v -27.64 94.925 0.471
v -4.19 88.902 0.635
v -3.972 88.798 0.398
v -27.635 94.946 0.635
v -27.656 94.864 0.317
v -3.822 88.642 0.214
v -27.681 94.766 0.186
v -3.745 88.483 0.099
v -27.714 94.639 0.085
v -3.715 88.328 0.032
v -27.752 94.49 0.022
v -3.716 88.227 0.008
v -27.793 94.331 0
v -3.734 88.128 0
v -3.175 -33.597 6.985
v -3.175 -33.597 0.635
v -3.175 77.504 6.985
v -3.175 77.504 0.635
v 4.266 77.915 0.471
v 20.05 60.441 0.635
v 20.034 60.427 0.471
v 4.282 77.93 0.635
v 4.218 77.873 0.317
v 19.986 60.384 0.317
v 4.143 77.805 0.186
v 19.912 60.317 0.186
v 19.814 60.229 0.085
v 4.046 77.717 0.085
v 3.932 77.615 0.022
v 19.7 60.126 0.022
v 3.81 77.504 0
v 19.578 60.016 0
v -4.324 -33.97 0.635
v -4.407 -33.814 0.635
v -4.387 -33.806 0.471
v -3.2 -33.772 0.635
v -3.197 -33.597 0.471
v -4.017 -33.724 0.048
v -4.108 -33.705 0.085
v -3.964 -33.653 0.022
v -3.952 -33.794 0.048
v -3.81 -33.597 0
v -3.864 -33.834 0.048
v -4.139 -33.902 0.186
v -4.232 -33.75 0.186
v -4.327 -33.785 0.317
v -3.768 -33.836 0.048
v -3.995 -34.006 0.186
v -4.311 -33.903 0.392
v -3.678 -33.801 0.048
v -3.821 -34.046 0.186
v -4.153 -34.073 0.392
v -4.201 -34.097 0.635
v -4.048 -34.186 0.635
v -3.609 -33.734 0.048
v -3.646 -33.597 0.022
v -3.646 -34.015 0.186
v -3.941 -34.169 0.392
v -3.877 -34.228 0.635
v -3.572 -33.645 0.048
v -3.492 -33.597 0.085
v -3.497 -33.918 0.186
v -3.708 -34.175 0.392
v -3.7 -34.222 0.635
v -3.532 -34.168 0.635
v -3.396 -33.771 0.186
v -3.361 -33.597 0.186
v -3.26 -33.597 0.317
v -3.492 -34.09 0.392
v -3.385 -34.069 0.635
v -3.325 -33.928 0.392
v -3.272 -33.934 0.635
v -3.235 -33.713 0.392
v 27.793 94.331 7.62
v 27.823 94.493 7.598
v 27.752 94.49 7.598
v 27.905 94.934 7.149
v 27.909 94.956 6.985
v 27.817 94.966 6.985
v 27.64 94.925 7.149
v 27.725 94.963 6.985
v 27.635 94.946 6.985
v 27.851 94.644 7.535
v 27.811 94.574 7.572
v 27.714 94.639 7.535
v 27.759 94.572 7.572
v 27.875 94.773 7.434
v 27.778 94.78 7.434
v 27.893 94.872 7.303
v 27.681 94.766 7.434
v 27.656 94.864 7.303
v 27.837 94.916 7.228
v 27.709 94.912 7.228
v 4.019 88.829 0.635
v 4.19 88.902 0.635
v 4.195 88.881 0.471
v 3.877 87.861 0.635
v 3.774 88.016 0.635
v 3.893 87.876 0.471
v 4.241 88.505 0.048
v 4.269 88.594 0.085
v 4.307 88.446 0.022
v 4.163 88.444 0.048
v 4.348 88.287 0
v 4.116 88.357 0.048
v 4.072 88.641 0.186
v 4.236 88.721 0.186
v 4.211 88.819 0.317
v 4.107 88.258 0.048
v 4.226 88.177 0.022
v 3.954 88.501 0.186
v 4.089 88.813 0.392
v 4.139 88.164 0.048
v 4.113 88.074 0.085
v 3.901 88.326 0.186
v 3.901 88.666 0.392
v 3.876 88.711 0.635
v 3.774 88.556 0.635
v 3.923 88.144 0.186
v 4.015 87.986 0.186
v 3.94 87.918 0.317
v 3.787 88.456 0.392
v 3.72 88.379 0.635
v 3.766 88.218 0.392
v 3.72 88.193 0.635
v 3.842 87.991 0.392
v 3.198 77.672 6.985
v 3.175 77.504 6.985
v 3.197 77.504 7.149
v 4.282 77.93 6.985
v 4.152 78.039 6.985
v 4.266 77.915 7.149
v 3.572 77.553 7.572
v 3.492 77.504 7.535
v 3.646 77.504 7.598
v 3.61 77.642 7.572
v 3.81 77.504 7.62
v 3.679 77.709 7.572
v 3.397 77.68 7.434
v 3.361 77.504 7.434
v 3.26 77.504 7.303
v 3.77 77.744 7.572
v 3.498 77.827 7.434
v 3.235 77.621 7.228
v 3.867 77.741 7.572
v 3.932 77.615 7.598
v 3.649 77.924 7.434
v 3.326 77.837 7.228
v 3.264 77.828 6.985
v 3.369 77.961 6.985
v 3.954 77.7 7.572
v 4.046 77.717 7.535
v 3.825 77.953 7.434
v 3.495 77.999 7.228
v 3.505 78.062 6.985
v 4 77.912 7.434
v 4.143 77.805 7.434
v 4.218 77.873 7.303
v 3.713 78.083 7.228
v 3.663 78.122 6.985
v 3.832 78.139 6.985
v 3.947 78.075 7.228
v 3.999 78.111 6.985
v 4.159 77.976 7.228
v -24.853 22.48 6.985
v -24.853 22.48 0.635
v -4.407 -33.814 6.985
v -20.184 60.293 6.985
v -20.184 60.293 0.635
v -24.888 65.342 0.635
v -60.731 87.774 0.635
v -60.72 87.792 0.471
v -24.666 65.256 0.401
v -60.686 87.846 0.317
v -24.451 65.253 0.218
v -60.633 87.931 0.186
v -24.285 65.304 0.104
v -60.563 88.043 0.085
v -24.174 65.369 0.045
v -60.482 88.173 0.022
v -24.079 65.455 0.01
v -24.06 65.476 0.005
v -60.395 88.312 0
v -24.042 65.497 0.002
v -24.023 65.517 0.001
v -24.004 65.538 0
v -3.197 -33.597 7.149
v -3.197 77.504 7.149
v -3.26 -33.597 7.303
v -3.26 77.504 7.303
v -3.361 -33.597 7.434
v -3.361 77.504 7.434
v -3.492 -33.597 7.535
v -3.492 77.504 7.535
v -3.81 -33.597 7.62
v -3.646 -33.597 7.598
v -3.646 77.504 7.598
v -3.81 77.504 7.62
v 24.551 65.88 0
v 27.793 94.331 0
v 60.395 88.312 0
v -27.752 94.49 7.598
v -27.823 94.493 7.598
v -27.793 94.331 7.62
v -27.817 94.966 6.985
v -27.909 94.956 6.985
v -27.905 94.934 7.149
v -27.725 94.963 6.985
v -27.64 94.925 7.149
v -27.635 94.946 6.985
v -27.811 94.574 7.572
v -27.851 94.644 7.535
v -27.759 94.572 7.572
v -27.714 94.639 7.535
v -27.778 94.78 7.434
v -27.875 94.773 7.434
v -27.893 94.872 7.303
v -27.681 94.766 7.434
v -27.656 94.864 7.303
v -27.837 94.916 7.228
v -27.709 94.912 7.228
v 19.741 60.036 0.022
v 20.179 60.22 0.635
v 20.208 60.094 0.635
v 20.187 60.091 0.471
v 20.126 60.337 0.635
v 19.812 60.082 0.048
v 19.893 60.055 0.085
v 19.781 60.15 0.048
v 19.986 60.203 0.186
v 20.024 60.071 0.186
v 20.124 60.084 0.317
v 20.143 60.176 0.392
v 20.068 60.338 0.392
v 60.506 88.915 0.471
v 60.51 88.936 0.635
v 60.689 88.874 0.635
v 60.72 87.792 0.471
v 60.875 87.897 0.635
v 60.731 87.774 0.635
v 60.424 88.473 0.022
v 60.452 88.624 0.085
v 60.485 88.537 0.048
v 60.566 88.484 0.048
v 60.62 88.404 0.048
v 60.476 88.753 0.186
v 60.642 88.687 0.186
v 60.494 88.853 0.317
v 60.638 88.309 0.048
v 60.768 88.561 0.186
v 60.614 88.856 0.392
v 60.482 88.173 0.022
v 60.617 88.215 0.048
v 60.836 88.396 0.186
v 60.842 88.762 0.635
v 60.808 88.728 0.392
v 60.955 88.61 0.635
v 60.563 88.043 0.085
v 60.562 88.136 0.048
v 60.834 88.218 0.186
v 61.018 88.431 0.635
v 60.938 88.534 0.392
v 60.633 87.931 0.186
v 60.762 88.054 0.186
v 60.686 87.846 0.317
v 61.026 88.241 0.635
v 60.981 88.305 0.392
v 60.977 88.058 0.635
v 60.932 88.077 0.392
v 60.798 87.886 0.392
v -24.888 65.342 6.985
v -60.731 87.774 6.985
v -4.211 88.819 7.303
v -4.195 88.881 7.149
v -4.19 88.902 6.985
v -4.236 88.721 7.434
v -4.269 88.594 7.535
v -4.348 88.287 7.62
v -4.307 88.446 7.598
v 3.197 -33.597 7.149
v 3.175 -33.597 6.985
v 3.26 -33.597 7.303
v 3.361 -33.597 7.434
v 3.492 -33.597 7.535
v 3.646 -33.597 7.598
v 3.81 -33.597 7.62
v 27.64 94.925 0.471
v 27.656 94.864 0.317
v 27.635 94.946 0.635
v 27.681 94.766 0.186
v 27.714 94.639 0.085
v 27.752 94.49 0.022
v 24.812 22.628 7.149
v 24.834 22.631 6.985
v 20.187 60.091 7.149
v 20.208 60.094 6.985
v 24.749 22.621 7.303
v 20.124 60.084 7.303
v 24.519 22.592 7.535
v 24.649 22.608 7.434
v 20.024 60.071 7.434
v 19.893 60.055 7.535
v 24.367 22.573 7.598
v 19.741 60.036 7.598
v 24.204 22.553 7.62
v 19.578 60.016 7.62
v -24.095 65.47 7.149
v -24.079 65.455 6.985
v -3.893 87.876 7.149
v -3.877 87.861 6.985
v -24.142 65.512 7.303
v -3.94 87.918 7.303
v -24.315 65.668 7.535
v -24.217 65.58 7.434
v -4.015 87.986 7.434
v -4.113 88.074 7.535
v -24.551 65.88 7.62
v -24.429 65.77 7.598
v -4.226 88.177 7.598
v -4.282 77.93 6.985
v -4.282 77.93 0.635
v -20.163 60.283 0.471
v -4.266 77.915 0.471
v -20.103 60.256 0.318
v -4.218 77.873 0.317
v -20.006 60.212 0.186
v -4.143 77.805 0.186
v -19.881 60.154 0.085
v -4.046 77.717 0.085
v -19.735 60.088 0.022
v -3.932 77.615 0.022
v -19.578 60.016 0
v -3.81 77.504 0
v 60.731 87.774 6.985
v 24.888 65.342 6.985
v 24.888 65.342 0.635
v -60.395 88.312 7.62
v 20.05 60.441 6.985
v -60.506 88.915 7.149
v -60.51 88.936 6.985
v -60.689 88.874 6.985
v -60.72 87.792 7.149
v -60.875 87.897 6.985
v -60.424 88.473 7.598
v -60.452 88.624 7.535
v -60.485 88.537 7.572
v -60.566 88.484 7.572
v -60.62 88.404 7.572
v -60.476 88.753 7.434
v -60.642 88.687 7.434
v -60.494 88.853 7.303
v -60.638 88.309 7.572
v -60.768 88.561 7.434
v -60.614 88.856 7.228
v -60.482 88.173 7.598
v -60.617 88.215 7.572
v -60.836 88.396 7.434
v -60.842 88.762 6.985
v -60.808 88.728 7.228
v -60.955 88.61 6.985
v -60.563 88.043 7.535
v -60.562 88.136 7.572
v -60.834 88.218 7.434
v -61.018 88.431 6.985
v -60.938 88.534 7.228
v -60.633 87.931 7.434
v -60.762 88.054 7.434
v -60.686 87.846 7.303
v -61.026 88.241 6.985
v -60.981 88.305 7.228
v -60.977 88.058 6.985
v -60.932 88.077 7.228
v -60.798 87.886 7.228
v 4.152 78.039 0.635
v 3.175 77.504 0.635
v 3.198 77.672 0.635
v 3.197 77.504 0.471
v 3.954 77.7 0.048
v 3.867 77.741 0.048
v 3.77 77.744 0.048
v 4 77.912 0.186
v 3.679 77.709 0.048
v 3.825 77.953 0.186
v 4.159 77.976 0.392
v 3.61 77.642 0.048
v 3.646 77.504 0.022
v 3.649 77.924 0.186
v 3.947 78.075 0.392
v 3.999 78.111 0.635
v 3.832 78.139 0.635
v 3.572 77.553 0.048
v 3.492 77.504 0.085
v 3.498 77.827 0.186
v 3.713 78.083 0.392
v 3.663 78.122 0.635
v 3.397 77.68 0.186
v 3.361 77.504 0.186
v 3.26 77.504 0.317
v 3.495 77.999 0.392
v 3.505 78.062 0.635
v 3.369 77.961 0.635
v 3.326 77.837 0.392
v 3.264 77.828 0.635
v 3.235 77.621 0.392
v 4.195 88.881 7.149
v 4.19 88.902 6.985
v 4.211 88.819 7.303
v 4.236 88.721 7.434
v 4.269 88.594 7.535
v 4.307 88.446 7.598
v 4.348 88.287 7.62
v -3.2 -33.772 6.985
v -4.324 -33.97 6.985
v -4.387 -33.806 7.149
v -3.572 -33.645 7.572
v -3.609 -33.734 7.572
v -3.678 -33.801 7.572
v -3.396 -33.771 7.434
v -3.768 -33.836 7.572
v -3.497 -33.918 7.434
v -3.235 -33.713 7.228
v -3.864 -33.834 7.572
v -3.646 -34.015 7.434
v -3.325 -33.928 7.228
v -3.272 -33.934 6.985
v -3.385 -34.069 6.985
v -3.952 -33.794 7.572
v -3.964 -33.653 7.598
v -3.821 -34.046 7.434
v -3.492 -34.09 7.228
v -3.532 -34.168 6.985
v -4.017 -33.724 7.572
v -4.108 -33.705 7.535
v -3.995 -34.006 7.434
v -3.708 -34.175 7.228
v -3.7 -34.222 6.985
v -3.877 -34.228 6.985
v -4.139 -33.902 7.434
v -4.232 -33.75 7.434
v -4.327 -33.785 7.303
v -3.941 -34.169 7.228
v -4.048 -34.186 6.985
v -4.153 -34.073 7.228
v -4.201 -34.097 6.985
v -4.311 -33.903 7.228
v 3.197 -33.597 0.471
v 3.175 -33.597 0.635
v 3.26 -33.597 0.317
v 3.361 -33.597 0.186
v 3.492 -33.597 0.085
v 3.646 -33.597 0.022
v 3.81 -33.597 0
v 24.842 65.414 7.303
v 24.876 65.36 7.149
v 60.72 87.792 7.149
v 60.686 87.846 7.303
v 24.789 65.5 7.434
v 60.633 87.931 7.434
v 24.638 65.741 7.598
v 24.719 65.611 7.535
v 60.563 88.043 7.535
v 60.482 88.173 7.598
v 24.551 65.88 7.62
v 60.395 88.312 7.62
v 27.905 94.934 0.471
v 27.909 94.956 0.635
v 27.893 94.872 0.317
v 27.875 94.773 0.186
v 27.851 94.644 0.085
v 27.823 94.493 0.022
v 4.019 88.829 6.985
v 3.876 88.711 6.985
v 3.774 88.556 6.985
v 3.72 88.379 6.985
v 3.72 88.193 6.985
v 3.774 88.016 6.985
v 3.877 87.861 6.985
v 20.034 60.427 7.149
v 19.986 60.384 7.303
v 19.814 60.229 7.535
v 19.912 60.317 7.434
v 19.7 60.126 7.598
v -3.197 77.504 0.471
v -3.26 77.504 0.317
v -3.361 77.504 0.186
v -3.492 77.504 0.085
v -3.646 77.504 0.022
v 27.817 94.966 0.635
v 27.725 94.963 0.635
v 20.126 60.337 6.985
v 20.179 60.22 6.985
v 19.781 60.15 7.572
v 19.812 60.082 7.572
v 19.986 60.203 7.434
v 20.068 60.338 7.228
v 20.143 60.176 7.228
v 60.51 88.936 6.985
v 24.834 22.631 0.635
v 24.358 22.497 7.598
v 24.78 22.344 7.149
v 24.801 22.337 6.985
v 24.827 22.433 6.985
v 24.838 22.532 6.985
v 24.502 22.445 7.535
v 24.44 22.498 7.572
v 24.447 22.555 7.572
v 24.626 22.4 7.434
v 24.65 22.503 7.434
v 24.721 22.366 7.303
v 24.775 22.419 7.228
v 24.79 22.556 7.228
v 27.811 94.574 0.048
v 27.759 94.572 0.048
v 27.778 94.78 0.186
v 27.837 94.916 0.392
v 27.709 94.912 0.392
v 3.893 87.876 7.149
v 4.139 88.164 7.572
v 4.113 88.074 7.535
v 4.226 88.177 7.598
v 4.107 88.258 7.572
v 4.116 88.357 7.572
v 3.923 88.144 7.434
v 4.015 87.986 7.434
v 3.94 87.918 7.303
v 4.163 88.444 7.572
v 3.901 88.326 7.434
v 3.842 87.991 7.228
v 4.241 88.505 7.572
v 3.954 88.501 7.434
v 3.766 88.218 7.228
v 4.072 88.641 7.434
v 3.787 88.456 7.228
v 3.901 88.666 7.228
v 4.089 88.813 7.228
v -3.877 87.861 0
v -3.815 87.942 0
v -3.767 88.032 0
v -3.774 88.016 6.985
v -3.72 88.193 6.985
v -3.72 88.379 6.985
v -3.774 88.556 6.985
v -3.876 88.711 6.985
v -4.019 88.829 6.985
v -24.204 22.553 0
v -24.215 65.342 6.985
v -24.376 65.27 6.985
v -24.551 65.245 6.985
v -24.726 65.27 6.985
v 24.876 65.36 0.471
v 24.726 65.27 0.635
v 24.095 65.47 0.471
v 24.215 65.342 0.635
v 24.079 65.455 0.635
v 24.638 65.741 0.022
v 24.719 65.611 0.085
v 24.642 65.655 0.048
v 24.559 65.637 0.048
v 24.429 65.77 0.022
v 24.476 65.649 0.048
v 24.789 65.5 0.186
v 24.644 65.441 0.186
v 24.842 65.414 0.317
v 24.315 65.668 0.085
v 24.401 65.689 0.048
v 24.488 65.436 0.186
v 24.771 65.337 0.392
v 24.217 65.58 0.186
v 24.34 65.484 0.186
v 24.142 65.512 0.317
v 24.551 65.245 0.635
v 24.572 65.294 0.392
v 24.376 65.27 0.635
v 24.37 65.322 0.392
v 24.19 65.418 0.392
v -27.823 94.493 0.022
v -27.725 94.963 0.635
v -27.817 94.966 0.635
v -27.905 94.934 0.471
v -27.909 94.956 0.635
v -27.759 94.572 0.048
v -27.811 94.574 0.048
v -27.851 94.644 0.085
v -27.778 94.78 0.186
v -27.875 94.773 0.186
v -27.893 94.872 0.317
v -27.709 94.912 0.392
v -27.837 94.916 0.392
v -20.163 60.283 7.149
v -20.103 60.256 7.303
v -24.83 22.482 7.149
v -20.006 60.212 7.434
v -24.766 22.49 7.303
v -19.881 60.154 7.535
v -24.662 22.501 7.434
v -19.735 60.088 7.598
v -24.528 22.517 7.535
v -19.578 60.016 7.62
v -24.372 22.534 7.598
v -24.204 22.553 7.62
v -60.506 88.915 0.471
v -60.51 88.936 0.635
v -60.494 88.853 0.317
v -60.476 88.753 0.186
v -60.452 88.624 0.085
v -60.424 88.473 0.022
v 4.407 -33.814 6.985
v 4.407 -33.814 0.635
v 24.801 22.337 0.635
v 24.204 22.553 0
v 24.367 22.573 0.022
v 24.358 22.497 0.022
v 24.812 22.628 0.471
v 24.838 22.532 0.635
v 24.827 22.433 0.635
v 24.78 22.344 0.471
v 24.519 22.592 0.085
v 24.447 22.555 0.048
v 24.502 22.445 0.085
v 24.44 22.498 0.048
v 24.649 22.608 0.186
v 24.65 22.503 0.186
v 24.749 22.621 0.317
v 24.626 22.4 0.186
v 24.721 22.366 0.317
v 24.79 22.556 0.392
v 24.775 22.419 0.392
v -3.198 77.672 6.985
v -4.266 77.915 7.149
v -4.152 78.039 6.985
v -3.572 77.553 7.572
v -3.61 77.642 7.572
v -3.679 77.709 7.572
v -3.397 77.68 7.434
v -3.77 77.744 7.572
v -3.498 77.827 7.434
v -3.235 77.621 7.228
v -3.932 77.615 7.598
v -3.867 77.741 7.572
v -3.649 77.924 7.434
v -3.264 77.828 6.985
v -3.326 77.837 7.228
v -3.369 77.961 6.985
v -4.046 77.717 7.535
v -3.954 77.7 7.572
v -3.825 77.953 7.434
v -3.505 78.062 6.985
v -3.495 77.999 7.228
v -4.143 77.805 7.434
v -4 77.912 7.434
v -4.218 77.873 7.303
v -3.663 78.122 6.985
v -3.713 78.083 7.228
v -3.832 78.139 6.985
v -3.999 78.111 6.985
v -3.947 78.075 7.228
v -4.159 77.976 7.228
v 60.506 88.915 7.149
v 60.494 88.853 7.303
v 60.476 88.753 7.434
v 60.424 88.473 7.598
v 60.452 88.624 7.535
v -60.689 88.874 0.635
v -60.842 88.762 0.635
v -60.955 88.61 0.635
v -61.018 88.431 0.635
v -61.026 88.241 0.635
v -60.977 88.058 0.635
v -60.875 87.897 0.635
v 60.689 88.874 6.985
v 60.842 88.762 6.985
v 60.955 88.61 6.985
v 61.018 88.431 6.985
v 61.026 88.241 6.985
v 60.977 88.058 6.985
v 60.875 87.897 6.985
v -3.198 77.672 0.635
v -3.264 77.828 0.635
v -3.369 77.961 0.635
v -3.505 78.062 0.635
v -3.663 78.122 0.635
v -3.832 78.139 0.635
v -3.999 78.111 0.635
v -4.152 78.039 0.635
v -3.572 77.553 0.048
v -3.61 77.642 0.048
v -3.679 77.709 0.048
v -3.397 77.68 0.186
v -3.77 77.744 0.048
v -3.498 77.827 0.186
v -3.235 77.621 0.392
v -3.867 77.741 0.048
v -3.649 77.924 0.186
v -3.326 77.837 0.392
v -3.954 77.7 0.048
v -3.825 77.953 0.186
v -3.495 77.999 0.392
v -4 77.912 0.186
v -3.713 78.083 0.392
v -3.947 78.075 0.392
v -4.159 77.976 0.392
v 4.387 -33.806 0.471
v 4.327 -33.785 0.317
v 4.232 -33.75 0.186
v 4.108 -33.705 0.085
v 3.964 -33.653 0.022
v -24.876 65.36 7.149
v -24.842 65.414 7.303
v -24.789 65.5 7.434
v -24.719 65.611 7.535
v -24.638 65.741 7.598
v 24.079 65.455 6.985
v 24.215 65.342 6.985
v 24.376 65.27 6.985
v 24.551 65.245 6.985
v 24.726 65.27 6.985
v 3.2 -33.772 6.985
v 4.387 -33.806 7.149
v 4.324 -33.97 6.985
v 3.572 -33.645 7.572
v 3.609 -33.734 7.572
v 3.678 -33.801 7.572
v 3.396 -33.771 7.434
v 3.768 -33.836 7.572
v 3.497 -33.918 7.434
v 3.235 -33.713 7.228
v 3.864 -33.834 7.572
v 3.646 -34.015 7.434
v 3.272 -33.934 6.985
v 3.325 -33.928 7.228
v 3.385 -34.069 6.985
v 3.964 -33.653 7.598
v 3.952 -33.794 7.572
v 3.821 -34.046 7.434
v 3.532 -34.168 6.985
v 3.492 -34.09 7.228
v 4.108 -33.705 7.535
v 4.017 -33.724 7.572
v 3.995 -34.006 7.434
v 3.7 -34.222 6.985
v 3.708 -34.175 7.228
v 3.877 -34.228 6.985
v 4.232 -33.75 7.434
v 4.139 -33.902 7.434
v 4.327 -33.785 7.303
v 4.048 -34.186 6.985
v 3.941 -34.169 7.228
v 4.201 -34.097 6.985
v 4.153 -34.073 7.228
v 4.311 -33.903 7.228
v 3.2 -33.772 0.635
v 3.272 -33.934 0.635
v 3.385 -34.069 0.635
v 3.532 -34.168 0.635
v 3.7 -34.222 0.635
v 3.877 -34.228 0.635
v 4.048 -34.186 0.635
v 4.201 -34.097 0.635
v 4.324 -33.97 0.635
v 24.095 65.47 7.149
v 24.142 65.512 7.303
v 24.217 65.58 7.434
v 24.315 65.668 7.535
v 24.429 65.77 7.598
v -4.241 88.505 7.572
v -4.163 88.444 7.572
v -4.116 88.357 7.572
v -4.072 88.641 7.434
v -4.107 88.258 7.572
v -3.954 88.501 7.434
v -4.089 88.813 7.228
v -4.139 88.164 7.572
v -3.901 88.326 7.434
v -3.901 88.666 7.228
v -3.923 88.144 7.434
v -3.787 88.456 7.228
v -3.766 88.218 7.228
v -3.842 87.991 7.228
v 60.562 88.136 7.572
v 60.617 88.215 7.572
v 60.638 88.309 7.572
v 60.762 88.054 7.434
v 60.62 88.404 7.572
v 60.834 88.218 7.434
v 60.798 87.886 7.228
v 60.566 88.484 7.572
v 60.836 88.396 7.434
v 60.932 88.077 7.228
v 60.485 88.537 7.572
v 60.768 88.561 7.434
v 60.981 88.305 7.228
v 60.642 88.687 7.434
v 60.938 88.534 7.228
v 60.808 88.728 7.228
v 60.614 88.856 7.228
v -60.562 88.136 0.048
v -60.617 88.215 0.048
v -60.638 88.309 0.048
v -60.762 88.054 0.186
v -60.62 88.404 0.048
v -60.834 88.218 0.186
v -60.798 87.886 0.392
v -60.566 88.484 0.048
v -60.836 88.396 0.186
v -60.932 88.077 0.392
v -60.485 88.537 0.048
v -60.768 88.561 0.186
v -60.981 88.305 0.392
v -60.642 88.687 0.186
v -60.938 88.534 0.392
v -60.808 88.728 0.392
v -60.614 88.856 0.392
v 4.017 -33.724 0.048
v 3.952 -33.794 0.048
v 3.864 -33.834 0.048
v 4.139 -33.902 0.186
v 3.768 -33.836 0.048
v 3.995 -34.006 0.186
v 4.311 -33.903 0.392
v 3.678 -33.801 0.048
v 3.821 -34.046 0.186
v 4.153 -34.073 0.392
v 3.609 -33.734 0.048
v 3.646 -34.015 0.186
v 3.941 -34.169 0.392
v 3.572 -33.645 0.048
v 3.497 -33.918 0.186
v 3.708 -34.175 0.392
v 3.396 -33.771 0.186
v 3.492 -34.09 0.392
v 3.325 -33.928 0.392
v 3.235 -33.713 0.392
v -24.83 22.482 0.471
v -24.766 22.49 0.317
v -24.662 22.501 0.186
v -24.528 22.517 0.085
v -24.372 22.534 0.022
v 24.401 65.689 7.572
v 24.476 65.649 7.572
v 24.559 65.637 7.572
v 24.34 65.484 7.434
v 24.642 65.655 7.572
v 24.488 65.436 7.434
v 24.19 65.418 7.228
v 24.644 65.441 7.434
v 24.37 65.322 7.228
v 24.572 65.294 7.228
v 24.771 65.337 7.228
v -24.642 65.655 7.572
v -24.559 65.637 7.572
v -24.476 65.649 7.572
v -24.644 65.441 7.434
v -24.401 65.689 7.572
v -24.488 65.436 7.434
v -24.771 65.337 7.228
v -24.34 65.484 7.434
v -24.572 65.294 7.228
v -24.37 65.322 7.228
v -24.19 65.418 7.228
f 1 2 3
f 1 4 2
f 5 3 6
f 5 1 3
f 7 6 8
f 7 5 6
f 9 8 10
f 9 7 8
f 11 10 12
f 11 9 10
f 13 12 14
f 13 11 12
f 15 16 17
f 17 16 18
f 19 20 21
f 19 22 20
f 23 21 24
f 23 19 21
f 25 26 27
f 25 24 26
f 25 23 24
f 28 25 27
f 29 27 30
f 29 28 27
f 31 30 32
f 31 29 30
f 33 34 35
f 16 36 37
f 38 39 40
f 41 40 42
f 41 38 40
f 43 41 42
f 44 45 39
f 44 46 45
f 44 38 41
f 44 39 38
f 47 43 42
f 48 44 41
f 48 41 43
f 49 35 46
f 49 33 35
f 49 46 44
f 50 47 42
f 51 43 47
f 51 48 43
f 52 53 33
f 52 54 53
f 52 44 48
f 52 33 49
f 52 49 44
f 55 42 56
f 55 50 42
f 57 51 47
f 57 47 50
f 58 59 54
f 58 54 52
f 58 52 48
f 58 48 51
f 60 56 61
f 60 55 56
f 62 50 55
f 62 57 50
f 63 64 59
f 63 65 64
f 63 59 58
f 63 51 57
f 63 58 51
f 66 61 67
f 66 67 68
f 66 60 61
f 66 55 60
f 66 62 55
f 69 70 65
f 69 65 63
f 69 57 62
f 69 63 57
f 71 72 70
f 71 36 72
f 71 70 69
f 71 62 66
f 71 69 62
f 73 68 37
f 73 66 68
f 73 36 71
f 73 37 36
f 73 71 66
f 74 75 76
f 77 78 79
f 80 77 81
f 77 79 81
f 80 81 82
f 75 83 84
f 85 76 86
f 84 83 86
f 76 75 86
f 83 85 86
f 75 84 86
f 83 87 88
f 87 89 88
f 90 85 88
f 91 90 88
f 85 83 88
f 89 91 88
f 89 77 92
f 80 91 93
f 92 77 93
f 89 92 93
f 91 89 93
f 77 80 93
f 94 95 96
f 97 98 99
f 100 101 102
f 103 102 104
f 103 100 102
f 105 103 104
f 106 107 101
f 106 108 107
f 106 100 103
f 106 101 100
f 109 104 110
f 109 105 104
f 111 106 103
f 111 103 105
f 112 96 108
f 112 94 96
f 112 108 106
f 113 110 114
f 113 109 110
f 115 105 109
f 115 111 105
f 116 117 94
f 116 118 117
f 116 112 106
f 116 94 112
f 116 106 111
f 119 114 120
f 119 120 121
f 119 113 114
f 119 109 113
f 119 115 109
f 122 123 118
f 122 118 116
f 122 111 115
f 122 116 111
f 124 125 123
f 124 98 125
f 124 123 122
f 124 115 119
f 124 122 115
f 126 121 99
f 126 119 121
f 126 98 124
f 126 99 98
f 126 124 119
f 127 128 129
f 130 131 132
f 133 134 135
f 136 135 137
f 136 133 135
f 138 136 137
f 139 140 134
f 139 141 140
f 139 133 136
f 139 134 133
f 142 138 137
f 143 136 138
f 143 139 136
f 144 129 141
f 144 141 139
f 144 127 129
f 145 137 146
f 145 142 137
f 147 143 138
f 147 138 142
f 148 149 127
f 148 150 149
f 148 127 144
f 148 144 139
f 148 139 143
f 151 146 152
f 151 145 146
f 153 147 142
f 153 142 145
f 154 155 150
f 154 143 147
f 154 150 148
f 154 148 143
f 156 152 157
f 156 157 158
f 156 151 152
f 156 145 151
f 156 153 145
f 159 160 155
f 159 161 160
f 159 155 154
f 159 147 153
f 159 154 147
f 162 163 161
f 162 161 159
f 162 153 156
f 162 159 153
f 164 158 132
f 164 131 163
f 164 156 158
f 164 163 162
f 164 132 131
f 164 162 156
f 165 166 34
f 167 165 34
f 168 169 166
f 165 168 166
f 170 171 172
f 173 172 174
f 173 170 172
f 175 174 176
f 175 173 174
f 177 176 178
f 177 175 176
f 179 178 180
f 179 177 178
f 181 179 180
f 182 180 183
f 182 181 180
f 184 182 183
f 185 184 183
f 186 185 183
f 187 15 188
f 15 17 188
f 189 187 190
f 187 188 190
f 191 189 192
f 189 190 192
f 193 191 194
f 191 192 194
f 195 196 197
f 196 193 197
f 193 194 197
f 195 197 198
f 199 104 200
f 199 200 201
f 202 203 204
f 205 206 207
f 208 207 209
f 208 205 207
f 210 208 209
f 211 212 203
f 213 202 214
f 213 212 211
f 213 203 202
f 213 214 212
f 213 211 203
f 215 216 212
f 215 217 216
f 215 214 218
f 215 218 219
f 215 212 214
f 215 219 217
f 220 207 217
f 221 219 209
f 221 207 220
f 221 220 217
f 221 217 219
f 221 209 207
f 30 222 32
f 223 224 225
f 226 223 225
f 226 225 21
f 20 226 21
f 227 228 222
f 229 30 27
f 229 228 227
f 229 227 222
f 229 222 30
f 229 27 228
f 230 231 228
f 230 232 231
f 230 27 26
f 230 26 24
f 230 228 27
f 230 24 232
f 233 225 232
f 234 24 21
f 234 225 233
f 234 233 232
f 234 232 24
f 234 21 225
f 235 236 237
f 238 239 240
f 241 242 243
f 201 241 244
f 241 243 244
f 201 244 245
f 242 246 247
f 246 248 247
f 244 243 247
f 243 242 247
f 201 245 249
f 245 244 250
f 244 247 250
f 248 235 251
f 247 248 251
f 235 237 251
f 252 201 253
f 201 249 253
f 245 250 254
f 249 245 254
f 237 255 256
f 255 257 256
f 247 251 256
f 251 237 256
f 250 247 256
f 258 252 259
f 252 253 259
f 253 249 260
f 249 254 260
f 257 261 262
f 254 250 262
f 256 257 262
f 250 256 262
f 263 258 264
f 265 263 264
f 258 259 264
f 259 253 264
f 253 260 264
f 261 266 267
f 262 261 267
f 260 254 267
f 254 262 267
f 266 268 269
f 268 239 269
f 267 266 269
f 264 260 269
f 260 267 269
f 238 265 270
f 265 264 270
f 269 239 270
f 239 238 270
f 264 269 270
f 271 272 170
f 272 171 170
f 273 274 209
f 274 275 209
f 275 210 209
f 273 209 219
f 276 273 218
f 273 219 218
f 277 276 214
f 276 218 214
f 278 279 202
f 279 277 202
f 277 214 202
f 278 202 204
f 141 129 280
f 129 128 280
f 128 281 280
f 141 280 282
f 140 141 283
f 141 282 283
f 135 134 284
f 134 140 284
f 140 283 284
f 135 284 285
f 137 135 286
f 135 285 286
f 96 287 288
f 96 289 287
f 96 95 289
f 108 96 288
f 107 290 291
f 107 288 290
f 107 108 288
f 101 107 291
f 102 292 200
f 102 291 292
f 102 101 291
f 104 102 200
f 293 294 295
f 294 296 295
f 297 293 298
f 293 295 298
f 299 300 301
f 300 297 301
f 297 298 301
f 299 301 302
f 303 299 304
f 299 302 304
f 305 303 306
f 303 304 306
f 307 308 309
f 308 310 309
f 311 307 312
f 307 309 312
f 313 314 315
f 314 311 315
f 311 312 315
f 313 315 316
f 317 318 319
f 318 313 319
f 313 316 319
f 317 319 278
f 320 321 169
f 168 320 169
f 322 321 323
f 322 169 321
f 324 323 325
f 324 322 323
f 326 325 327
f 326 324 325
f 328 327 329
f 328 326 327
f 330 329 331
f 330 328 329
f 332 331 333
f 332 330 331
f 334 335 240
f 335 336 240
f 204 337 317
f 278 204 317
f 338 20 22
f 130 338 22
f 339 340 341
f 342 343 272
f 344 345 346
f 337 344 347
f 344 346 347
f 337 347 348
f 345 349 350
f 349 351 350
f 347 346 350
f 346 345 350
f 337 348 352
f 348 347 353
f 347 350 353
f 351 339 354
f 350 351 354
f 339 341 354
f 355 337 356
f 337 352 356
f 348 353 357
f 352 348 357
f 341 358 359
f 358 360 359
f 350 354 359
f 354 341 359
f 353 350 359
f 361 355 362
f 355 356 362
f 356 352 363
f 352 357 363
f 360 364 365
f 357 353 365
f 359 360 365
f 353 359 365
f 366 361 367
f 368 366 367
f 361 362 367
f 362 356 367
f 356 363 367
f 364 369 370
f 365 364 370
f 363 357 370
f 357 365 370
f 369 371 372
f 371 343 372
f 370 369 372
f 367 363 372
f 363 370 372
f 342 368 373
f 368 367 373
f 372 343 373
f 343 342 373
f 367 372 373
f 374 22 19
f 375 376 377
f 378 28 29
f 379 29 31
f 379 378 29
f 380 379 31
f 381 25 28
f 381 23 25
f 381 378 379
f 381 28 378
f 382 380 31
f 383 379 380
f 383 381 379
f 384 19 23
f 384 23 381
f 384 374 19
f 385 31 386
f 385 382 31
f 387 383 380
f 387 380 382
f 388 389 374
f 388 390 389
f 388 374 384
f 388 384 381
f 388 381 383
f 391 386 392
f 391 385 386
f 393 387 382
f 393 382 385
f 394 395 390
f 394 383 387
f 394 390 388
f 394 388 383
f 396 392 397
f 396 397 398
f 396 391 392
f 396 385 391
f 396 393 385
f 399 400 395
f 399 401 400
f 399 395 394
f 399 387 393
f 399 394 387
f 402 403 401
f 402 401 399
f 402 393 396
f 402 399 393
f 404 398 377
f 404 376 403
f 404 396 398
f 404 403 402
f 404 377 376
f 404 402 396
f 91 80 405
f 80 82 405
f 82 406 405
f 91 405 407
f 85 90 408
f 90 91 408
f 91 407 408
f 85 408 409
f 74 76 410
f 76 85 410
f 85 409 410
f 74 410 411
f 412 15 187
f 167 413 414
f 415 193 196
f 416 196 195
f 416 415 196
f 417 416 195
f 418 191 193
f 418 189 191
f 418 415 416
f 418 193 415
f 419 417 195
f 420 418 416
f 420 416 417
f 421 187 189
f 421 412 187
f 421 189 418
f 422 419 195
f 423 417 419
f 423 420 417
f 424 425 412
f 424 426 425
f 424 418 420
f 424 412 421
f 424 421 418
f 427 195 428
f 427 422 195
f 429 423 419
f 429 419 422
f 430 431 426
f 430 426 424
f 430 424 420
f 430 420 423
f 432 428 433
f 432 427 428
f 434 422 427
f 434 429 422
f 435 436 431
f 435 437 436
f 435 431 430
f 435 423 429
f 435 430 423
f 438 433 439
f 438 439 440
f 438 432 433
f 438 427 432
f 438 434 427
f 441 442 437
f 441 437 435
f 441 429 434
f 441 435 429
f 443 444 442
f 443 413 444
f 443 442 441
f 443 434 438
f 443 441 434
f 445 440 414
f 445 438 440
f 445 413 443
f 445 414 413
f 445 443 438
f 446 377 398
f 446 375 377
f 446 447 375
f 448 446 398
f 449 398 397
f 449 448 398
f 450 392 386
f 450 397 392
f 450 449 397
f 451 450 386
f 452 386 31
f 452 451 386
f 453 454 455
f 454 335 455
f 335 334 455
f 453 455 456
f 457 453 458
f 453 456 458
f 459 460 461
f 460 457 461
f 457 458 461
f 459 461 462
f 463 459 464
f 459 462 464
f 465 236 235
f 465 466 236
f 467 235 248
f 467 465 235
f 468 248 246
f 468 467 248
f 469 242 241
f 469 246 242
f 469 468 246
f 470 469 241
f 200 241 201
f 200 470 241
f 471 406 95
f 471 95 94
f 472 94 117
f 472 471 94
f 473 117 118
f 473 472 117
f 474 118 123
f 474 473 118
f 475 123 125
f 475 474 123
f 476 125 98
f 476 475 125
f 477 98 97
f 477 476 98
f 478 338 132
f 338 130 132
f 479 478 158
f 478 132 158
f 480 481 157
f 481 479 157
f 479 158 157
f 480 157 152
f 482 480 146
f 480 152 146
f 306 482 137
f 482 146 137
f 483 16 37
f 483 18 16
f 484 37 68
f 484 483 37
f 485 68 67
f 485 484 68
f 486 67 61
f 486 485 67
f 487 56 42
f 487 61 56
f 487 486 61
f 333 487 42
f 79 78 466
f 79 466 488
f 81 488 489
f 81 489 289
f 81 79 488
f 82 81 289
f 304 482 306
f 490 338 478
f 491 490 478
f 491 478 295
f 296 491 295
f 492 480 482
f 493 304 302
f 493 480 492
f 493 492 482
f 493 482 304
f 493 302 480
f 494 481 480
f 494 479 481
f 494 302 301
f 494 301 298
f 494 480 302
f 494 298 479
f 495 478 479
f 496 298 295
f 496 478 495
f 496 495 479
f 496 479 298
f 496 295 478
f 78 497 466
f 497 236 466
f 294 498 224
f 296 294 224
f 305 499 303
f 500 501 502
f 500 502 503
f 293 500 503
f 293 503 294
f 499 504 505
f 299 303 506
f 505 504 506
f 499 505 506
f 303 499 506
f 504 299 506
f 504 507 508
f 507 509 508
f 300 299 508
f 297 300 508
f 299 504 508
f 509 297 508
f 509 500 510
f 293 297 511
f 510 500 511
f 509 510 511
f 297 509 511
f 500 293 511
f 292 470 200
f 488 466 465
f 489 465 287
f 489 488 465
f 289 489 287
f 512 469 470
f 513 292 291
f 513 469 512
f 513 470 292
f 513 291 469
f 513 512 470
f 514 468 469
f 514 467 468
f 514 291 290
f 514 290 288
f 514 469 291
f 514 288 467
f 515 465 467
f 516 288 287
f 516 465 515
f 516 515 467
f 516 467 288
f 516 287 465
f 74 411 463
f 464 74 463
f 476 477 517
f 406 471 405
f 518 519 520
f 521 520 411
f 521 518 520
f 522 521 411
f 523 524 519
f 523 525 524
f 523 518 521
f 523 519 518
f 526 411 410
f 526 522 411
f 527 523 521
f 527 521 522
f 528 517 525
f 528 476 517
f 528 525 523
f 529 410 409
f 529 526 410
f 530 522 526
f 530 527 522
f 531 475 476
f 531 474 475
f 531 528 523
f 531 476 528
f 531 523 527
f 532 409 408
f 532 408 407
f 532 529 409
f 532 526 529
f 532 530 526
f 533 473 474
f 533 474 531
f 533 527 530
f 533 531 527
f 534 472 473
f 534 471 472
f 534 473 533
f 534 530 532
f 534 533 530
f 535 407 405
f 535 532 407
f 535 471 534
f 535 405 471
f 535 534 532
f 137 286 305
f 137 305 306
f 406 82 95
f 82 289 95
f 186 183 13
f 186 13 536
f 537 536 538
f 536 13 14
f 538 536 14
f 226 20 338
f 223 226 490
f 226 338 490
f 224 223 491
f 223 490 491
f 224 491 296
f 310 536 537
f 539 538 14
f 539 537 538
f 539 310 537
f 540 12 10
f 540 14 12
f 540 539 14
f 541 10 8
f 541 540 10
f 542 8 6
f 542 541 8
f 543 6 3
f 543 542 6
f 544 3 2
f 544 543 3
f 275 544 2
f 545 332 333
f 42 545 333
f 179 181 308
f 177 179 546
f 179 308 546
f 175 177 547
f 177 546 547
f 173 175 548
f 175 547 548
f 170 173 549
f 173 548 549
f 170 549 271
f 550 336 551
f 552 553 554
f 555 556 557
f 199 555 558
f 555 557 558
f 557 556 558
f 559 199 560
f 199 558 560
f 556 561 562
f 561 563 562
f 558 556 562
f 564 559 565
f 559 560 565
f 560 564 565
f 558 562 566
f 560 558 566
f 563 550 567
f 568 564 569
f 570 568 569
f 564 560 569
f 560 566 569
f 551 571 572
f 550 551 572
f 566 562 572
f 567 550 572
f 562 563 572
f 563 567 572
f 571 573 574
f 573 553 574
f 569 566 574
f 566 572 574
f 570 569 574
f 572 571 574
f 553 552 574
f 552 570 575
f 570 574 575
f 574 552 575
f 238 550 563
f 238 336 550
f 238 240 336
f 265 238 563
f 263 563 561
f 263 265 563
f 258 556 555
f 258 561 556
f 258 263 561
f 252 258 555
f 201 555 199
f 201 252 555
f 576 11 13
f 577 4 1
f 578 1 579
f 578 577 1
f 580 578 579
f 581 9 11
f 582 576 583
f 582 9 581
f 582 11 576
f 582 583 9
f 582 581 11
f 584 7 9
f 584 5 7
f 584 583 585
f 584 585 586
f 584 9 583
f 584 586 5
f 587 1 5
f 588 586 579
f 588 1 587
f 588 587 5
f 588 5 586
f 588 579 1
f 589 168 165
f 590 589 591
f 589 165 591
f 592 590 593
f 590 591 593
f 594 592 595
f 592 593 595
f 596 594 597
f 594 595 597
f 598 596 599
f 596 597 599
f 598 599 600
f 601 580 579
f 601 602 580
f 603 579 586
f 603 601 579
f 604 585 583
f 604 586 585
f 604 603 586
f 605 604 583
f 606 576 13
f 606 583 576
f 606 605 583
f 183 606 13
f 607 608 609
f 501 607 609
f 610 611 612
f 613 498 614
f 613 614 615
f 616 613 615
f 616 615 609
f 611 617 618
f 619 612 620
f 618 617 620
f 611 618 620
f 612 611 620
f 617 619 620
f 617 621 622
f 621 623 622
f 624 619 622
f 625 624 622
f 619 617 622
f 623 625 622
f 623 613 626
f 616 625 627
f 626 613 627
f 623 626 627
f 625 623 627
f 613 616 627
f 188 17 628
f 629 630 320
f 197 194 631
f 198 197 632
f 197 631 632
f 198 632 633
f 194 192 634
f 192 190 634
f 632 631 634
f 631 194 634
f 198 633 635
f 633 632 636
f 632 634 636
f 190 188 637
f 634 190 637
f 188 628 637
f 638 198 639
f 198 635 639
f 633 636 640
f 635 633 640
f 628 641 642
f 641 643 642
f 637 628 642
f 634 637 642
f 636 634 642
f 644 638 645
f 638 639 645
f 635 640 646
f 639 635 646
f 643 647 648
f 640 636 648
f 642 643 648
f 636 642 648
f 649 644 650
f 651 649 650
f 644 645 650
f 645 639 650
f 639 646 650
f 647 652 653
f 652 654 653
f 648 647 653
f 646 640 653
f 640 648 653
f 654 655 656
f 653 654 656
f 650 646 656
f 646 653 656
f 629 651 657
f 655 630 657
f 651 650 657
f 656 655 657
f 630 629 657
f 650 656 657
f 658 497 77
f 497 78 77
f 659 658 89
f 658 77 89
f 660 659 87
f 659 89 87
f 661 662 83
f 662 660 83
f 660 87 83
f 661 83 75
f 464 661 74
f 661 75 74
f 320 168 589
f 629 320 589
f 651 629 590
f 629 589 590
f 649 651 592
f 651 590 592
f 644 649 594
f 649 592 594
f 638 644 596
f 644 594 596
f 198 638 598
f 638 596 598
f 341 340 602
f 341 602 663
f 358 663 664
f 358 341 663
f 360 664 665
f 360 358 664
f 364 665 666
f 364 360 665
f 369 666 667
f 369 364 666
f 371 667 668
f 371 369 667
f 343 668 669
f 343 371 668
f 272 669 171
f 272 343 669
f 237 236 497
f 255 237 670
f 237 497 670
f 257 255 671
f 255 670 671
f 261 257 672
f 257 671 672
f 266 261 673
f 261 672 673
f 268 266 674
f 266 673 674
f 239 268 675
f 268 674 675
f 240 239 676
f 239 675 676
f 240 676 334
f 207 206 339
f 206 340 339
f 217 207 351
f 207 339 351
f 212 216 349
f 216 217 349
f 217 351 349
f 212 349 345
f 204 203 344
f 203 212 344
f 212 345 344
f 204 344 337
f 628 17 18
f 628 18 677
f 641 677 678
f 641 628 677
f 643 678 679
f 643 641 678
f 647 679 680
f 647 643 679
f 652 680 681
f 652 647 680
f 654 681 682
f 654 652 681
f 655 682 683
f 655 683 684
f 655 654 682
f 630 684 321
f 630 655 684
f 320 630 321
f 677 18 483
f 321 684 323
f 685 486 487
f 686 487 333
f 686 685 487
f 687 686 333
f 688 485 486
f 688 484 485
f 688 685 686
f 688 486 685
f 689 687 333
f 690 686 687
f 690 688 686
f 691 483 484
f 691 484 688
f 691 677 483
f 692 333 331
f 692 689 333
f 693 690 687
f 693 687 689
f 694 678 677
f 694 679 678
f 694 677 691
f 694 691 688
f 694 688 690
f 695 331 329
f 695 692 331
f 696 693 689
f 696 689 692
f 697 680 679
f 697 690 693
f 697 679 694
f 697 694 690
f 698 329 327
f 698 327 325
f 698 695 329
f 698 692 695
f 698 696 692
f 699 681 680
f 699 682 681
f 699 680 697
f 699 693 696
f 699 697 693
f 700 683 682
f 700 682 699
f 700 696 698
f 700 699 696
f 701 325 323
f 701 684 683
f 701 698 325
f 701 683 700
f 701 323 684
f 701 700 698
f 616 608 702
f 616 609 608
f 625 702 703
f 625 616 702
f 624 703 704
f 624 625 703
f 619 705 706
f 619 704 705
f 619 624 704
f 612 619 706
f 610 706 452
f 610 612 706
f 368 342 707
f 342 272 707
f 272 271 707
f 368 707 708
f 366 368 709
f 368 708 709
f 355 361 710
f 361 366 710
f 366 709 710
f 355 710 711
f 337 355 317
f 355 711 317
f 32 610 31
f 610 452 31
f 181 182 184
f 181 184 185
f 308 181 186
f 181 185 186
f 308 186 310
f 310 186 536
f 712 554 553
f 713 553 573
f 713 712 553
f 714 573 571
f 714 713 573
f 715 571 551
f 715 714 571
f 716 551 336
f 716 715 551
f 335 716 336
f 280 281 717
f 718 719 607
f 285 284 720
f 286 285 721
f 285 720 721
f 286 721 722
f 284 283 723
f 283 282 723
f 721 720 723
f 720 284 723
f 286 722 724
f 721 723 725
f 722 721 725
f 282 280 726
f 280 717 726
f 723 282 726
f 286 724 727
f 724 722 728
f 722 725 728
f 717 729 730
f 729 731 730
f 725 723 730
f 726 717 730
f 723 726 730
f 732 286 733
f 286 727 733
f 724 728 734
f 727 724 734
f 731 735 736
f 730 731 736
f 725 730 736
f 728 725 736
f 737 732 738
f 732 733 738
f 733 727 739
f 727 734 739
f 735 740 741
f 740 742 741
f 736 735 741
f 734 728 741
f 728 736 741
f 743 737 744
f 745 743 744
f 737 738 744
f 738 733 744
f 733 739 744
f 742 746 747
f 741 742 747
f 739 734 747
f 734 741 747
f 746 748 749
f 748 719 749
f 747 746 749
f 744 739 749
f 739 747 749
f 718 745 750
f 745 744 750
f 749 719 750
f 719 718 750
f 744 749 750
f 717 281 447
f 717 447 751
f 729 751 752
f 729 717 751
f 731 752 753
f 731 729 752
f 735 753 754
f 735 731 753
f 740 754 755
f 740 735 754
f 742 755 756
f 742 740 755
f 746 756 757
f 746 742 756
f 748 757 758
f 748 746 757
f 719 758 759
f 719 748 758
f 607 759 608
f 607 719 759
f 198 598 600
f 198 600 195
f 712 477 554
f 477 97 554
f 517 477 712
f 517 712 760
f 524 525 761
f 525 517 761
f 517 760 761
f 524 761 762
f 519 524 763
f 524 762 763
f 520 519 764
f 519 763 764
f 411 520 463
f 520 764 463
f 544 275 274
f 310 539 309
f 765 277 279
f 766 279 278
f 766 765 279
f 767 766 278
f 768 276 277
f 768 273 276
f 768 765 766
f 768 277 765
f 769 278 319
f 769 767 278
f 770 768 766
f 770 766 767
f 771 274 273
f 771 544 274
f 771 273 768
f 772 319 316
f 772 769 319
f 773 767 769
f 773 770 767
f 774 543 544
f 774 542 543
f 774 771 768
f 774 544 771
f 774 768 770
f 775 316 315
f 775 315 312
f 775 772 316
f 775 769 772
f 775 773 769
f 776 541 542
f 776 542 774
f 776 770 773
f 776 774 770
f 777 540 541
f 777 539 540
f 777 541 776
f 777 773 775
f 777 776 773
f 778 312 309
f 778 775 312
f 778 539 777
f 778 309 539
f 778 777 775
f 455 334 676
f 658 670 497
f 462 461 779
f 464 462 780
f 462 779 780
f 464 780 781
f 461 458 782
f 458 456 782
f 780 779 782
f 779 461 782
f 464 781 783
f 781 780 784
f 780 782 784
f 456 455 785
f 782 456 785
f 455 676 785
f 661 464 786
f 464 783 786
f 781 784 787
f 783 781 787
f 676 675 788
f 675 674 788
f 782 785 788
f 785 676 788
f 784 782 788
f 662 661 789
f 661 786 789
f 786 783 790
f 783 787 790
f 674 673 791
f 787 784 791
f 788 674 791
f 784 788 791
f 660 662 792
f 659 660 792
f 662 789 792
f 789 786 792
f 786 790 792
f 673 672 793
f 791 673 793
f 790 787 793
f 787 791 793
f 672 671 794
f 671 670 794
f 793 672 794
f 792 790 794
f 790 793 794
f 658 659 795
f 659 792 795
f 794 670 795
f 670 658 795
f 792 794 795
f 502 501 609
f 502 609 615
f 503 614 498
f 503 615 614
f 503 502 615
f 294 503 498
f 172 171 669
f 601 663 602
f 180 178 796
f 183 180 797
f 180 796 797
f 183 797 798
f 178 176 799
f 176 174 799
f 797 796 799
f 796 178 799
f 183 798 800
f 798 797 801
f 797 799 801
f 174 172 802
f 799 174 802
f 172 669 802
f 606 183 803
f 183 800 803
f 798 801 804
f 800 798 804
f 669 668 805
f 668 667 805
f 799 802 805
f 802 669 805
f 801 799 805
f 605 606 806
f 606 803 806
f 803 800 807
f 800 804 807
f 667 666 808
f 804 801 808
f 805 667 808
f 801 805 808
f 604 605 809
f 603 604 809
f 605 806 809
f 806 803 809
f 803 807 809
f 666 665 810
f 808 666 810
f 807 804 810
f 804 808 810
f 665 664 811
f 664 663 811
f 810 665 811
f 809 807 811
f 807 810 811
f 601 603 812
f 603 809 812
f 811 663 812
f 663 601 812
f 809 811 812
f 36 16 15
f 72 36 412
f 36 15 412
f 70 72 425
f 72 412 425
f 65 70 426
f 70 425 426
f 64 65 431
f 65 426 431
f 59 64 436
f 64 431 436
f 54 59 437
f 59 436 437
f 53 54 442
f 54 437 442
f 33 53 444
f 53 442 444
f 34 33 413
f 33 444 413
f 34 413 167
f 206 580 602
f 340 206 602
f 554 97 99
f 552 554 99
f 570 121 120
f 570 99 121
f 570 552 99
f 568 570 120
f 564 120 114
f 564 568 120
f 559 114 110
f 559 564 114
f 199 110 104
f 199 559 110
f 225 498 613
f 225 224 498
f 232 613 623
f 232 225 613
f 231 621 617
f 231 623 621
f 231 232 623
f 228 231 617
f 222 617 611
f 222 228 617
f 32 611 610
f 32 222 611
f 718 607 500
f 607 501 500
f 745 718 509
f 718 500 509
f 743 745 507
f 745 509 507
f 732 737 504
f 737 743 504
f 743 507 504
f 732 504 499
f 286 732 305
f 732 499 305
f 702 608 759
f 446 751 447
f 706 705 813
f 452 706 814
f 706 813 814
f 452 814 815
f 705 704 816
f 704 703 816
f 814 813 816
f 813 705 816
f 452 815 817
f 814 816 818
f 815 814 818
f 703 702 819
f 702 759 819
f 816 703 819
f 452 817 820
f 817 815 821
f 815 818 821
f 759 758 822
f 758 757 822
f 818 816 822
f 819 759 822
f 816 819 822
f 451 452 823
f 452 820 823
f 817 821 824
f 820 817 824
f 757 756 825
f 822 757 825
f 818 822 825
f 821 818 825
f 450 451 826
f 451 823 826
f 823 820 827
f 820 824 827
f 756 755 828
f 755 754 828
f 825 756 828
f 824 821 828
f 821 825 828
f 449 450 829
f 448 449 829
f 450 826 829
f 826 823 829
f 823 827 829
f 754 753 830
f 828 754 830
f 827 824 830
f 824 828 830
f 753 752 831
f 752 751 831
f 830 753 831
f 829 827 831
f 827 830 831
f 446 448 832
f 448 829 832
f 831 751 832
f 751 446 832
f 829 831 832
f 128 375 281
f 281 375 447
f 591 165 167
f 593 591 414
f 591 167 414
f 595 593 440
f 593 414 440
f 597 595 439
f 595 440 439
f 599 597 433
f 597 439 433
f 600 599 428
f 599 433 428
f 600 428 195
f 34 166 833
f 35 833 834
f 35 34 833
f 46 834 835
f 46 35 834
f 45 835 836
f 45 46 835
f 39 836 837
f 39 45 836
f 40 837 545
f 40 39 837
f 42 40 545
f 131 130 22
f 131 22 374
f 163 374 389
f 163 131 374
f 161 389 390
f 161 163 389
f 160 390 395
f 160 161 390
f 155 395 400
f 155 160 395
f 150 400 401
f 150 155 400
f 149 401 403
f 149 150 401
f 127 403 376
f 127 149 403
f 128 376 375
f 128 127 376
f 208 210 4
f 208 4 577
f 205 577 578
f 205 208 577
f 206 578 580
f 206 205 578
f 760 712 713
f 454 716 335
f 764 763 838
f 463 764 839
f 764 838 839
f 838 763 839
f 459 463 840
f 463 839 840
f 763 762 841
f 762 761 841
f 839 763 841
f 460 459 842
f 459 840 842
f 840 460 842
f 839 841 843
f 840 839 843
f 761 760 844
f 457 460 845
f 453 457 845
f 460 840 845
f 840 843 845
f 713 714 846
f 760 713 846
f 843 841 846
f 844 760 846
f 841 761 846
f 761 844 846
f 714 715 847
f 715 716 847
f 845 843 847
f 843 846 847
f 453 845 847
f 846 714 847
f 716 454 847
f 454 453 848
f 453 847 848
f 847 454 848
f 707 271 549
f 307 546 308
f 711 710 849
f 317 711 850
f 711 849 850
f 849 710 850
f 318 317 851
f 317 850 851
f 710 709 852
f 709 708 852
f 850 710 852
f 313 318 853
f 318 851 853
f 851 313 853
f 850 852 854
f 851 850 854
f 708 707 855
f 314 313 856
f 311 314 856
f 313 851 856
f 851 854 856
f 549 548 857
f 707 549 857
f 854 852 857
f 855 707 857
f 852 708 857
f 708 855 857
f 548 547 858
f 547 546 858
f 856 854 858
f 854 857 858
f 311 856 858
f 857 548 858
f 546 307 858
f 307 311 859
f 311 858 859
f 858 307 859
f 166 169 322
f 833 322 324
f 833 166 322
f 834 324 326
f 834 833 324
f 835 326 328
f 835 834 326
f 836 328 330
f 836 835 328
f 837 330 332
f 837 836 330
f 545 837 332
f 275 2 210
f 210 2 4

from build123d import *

# Parameters (mm, degrees)
F1_DEPTH = 7.62
F2_R     = 0.635


with BuildPart() as f1:
    # F0 (on Top) → F1 (new body)
    with BuildSketch(Plane.XY):
        Polygon((20.183703, 60.292676), (3.175, 79.157035), (3.175, -37.205468), (24.852548, 22.479823), align=None)
        Polygon((-24.435879, 65.059379), (-3.175, 88.639827), (-27.770663, 94.981226), (-62.115648, 88.639827), align=None)
        Polygon((-3.175, -37.205468), (-3.175, 79.157035), (-20.183703, 60.292676), (-24.852548, 22.479823), align=None)
        Polygon((62.115648, 88.639827), (27.770663, 94.981226), (3.175, 88.639827), (24.435879, 65.059379), align=None)
    extrude(amount=F1_DEPTH)

    # F2
    f2_edges = [f1.edges().sort_by_distance(p)[0] for p in [
        (3.175, -37.205468, 3.81),
        (-3.175, -37.205468, 3.81),
        (20.183703, 60.292676, 3.81),
        (24.852548, 22.479823, 3.81),
        (-3.175, 79.157035, 3.81),
        (-43.275764, 76.849603, 7.62),
        (-62.115648, 88.639827, 3.81),
        (-43.275764, 76.849603, 0),
        (-44.943156, 91.810526, 7.62),
        (-15.472832, 91.810526, 7.62),
        (-13.80544, 76.849603, 7.62),
        (-3.175, 88.639827, 3.81),
        (-27.770663, 94.981226, 3.81),
        (-15.472832, 91.810526, 0),
        (-44.943156, 91.810526, 0),
        (13.80544, 76.849603, 7.62),
        (11.679352, 69.724856, 7.62),
        (3.175, 79.157035, 3.81),
        (-3.175, 20.975783, 7.62),
        (-11.679352, 69.724856, 7.62),
        (-22.518126, 41.38625, 7.62),
        (-14.013774, -7.362822, 7.62),
        (3.175, 20.975783, 7.62),
        (14.013774, -7.362822, 7.62),
        (22.518126, 41.38625, 0),
        (22.518126, 41.38625, 7.62),
        (14.013774, -7.362822, 0),
        (43.275764, 76.849603, 7.62),
        (44.943156, 91.810526, 7.62),
        (15.472832, 91.810526, 7.62),
        (15.472832, 91.810526, 0),
        (62.115648, 88.639827, 3.81),
        (27.770663, 94.981226, 3.81),
        (44.943156, 91.810526, 0),
        (24.435879, 65.059379, 3.81),
        (43.275764, 76.849603, 0),
        (13.80544, 76.849603, 0),
        (3.175, 88.639827, 3.81),
        (-24.435879, 65.059379, 3.81),
        (-22.518126, 41.38625, 0),
        (-14.013774, -7.362822, 0),
        (-3.175, 20.975783, 0),
        (-11.679352, 69.724856, 0),
        (11.679352, 69.724856, 0),
        (3.175, 20.975783, 0),
    ]]
    fillet(f2_edges, radius=F2_R)


solid = f1.part
